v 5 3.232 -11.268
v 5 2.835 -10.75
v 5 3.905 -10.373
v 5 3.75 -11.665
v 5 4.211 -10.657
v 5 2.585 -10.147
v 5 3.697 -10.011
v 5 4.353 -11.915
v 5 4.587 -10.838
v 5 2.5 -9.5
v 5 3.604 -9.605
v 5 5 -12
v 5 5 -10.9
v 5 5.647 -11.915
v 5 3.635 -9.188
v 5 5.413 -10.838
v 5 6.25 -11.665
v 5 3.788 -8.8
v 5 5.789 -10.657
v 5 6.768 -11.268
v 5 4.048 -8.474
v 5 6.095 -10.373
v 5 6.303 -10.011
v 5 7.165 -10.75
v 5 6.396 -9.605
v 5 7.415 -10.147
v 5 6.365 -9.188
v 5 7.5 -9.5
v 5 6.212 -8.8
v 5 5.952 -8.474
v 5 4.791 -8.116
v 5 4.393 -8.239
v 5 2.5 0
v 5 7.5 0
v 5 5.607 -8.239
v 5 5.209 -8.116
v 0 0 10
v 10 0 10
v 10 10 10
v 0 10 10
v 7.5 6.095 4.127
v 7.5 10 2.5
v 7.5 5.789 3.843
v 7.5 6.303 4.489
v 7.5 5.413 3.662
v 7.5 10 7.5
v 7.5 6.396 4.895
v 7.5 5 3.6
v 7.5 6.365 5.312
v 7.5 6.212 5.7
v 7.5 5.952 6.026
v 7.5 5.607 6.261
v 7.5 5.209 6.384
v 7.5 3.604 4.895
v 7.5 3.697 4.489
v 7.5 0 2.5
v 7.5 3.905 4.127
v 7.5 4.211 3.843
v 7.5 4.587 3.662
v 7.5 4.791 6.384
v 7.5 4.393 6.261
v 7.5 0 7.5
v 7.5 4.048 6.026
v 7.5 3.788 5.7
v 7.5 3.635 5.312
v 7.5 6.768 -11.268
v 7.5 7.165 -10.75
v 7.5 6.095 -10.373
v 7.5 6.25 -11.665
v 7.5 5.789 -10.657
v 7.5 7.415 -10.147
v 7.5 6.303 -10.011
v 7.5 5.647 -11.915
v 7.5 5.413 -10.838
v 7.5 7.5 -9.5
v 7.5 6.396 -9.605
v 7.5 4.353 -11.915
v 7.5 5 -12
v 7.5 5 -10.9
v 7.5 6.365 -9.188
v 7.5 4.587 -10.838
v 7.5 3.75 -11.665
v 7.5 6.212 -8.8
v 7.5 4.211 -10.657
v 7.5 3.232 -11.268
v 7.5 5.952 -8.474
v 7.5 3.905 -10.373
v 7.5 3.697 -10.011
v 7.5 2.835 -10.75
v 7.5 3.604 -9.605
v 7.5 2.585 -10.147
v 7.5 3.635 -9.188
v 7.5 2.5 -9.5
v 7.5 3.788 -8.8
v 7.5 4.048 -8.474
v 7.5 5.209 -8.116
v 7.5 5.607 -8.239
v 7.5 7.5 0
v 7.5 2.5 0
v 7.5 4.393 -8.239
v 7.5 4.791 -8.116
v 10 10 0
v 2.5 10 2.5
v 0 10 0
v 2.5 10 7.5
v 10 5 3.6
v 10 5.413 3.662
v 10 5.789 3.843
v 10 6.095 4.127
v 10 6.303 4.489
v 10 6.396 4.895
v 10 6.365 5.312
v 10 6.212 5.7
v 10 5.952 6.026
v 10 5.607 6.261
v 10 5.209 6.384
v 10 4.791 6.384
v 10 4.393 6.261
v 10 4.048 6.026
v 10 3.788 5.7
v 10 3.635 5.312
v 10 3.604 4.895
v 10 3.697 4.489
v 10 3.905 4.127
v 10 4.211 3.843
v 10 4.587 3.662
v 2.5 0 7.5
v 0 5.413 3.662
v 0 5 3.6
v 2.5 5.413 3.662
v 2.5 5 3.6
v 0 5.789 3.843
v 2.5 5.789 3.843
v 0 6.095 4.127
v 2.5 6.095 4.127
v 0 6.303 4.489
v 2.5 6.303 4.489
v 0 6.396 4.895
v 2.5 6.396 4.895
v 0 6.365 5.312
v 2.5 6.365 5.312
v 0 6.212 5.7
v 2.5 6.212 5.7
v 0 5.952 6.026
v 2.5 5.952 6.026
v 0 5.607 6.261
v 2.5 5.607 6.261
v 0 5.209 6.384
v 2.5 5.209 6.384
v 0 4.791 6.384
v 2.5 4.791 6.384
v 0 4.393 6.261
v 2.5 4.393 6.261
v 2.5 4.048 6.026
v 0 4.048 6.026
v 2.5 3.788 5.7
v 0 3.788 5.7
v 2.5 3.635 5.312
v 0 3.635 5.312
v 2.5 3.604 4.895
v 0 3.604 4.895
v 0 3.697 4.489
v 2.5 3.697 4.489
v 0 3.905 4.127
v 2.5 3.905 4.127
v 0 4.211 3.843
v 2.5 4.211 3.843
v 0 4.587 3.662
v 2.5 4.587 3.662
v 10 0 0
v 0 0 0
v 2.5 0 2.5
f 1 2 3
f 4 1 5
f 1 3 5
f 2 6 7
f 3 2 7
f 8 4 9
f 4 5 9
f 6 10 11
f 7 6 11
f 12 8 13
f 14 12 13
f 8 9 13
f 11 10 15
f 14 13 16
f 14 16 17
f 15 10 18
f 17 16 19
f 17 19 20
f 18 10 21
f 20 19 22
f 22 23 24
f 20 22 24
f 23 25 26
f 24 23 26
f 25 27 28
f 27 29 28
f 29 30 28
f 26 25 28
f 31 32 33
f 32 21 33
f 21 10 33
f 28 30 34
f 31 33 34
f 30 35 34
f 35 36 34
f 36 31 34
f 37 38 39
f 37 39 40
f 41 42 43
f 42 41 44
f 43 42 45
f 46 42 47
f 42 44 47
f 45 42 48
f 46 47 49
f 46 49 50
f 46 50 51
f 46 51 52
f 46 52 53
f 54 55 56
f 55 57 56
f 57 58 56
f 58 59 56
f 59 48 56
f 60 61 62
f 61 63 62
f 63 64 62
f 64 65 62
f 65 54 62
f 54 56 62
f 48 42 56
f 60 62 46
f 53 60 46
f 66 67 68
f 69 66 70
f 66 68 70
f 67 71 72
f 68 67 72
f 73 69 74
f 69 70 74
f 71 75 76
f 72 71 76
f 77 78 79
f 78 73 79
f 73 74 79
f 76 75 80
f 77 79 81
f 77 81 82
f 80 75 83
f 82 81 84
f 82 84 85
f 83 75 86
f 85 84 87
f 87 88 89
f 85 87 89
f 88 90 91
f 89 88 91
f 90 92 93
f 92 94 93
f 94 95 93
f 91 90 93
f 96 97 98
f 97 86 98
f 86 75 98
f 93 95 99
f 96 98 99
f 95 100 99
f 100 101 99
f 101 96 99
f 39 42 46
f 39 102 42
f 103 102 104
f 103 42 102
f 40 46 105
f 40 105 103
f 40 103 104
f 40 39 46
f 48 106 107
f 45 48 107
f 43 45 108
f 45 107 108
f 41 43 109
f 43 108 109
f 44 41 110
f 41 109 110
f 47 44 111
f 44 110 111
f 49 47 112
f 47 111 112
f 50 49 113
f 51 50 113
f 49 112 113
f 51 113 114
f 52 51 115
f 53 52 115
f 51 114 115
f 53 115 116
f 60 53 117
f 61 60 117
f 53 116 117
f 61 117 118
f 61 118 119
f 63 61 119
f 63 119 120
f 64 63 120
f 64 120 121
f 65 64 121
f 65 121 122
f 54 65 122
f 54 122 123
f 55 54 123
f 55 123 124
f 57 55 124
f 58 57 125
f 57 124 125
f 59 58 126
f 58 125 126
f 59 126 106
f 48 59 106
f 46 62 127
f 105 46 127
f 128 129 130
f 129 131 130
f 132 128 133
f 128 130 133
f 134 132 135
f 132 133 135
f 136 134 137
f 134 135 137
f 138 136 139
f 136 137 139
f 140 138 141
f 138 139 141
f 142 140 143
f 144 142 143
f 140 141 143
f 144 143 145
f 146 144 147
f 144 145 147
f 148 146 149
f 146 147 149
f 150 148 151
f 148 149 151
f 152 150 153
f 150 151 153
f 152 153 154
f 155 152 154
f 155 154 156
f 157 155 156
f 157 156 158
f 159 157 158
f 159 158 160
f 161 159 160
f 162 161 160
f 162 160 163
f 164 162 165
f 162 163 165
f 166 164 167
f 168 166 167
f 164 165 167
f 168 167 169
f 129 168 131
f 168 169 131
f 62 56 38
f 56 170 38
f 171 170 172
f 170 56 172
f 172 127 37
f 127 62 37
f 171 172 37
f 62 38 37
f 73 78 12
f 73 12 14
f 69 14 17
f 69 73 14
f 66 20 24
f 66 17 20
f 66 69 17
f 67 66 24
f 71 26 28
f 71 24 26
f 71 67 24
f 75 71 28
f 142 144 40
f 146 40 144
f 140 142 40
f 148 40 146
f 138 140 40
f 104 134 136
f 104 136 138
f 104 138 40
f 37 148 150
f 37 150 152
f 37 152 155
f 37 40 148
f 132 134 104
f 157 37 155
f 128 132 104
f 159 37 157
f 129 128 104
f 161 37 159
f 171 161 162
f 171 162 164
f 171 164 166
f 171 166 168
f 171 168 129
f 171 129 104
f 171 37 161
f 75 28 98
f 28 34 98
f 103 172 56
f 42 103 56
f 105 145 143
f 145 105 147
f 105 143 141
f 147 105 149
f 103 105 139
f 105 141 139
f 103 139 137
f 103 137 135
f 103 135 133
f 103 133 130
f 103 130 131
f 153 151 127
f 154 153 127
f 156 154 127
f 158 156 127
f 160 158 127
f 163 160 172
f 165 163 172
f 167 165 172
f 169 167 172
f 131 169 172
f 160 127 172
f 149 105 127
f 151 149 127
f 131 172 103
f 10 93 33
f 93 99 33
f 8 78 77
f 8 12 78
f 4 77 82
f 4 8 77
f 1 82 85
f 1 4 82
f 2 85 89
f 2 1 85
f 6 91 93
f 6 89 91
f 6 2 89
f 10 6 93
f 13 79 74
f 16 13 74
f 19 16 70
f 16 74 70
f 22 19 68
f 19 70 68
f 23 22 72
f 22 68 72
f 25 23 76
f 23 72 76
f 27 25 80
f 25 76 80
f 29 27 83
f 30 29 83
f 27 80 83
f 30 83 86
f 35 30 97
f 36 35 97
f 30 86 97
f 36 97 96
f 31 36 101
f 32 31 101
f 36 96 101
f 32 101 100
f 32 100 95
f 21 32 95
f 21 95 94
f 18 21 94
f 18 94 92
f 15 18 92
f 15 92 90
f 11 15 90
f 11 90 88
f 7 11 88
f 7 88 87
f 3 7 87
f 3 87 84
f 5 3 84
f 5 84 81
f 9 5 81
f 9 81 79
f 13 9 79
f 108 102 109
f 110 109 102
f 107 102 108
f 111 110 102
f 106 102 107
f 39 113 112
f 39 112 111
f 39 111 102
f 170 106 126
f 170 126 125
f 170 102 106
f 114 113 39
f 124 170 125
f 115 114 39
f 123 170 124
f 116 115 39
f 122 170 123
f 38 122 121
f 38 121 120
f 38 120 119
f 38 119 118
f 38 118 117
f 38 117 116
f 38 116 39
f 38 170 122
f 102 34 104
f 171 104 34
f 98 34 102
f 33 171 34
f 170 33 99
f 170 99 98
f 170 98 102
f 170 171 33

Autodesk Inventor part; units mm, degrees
ref_plane "YZ Plane" through (0, 0, 0) normal (1, 0, 0) x (0, 1, 0)
ref_plane "XZ Plane" through (0, 0, 0) normal (0, 1, 0) x (-1, 0, 0)
ref_plane "XY Plane" through (0, 0, 0) normal (0, 0, 1) x (1, 0, 0)
sketch "Sketch1" plane through (0, 0, 0) normal (0, 1, 0) x (-1, 0, 0)
  line L0 (0, 0) -> (-10, 0)
  line L1 (-10, 0) -> (-10, 10)
  line L2 (-10, 10) -> (0, 10)
  line L3 (0, 10) -> (0, 0)
  line L4 (0, 0) -> (-2.5, 0)
  line L5 (-2.5, 0) -> (-2.5, 2.5)
  line L6 (-2.5, 2.5) -> (0, 2.5)
  line L7 (0, 2.5) -> (0, 0)
  line L8 (-2.5, 2.5) -> (-7.5, 2.5)
  line L9 (-7.5, 2.5) -> (-7.5, 7.5)
  line L10 (-7.5, 7.5) -> (-2.5, 7.5)
  line L11 (-2.5, 7.5) -> (-2.5, 2.5)
  dimension "d0" = 10
  dimension "d1" = 10
  dimension "d2" = 2.5
  dimension "d3" = 2.5
  dimension "d4" = 5
  dimension "d5" = 5
extrude "Extrusion1" add sketch "Sketch1" along normal blind 10
sketch "Sketch2" plane through (10, 0, 10) normal (1, 0, 0) x (0, 0, -1)
  line L0 (10, 10) -> (0, 10) projected
  line L1 (0, 10) -> (5, 10)
  line L2 (5, 10) -> (5, 5)
  line L3 (5, 5) -> (0, 5)
  line L4 (0, 5) -> (0, 10)
  circle A0 centre (5, 5) radius 1.4
  point P0 (10, 0)
  dimension "d8" = 5
  dimension "d9" = 5
  dimension "d10" = 2.8
extrude "Extrusion2" cut sketch "Sketch2" against normal through all contours A0 L3 L2 | L2 L3 A0
sketch "Sketch3" plane through (10, 0, 0) normal (0, 0, -1) x (-1, 0, 0)
  line L0 (0, 10) -> (10, 10) projected
  line L1 (10, 10) -> (7.5, 10)
  line L2 (7.5, 10) -> (7.5, 7.5)
  line L3 (7.5, 7.5) -> (10, 7.5)
  line L4 (10, 7.5) -> (10, 10)
  line L5 (7.5, 7.5) -> (2.5, 7.5)
  line L6 (2.5, 7.5) -> (2.5, 2.5)
  line L7 (2.5, 2.5) -> (7.5, 2.5)
  line L8 (7.5, 2.5) -> (7.5, 7.5)
  line L9 (2.5, 2.5) -> (5, 2.5)
  line L10 (5, 2.5) -> (5, 7.5)
  line L11 (5, 7.5) -> (2.5, 7.5)
  line L12 (2.5, 7.5) -> (2.5, 2.5)
  point P0 (10, 0)
  dimension "d13" = 2.5
  dimension "d14" = 2.5
  dimension "d15" = 5
  dimension "d16" = 5
extrude "Extrusion3" add sketch "Sketch3" along normal blind 12 contours L10 L7 L6 L5
sketch "Sketch4" plane through (7.5, 2.5, 0) normal (1, 0, 0) x (0, 0, -1)
  line L0 (0, 5) -> (12, 5) projected
  line L1 (12, 5) -> (9.5, 5)
  line L2 (9.5, 5) -> (9.5, 2.5)
  line L3 (9.5, 2.5) -> (12, 2.5)
  line L4 (12, 2.5) -> (12, 5)
  circle A0 centre (9.5, 2.5) radius 1.4
  point P0 (0, -2.5)
  dimension "d19" = 2.5
  dimension "d20" = 2.5
  dimension "d21" = 2.8
extrude "Extrusion4" cut sketch "Sketch4" against normal through all contours A0 L3 L2 | L2 L3 A0
fillet "Fillet1" radius 2.5 2 edges at (6.25, 7.5, -12) (6.25, 2.5, -12)
properties part number "CAM03"
